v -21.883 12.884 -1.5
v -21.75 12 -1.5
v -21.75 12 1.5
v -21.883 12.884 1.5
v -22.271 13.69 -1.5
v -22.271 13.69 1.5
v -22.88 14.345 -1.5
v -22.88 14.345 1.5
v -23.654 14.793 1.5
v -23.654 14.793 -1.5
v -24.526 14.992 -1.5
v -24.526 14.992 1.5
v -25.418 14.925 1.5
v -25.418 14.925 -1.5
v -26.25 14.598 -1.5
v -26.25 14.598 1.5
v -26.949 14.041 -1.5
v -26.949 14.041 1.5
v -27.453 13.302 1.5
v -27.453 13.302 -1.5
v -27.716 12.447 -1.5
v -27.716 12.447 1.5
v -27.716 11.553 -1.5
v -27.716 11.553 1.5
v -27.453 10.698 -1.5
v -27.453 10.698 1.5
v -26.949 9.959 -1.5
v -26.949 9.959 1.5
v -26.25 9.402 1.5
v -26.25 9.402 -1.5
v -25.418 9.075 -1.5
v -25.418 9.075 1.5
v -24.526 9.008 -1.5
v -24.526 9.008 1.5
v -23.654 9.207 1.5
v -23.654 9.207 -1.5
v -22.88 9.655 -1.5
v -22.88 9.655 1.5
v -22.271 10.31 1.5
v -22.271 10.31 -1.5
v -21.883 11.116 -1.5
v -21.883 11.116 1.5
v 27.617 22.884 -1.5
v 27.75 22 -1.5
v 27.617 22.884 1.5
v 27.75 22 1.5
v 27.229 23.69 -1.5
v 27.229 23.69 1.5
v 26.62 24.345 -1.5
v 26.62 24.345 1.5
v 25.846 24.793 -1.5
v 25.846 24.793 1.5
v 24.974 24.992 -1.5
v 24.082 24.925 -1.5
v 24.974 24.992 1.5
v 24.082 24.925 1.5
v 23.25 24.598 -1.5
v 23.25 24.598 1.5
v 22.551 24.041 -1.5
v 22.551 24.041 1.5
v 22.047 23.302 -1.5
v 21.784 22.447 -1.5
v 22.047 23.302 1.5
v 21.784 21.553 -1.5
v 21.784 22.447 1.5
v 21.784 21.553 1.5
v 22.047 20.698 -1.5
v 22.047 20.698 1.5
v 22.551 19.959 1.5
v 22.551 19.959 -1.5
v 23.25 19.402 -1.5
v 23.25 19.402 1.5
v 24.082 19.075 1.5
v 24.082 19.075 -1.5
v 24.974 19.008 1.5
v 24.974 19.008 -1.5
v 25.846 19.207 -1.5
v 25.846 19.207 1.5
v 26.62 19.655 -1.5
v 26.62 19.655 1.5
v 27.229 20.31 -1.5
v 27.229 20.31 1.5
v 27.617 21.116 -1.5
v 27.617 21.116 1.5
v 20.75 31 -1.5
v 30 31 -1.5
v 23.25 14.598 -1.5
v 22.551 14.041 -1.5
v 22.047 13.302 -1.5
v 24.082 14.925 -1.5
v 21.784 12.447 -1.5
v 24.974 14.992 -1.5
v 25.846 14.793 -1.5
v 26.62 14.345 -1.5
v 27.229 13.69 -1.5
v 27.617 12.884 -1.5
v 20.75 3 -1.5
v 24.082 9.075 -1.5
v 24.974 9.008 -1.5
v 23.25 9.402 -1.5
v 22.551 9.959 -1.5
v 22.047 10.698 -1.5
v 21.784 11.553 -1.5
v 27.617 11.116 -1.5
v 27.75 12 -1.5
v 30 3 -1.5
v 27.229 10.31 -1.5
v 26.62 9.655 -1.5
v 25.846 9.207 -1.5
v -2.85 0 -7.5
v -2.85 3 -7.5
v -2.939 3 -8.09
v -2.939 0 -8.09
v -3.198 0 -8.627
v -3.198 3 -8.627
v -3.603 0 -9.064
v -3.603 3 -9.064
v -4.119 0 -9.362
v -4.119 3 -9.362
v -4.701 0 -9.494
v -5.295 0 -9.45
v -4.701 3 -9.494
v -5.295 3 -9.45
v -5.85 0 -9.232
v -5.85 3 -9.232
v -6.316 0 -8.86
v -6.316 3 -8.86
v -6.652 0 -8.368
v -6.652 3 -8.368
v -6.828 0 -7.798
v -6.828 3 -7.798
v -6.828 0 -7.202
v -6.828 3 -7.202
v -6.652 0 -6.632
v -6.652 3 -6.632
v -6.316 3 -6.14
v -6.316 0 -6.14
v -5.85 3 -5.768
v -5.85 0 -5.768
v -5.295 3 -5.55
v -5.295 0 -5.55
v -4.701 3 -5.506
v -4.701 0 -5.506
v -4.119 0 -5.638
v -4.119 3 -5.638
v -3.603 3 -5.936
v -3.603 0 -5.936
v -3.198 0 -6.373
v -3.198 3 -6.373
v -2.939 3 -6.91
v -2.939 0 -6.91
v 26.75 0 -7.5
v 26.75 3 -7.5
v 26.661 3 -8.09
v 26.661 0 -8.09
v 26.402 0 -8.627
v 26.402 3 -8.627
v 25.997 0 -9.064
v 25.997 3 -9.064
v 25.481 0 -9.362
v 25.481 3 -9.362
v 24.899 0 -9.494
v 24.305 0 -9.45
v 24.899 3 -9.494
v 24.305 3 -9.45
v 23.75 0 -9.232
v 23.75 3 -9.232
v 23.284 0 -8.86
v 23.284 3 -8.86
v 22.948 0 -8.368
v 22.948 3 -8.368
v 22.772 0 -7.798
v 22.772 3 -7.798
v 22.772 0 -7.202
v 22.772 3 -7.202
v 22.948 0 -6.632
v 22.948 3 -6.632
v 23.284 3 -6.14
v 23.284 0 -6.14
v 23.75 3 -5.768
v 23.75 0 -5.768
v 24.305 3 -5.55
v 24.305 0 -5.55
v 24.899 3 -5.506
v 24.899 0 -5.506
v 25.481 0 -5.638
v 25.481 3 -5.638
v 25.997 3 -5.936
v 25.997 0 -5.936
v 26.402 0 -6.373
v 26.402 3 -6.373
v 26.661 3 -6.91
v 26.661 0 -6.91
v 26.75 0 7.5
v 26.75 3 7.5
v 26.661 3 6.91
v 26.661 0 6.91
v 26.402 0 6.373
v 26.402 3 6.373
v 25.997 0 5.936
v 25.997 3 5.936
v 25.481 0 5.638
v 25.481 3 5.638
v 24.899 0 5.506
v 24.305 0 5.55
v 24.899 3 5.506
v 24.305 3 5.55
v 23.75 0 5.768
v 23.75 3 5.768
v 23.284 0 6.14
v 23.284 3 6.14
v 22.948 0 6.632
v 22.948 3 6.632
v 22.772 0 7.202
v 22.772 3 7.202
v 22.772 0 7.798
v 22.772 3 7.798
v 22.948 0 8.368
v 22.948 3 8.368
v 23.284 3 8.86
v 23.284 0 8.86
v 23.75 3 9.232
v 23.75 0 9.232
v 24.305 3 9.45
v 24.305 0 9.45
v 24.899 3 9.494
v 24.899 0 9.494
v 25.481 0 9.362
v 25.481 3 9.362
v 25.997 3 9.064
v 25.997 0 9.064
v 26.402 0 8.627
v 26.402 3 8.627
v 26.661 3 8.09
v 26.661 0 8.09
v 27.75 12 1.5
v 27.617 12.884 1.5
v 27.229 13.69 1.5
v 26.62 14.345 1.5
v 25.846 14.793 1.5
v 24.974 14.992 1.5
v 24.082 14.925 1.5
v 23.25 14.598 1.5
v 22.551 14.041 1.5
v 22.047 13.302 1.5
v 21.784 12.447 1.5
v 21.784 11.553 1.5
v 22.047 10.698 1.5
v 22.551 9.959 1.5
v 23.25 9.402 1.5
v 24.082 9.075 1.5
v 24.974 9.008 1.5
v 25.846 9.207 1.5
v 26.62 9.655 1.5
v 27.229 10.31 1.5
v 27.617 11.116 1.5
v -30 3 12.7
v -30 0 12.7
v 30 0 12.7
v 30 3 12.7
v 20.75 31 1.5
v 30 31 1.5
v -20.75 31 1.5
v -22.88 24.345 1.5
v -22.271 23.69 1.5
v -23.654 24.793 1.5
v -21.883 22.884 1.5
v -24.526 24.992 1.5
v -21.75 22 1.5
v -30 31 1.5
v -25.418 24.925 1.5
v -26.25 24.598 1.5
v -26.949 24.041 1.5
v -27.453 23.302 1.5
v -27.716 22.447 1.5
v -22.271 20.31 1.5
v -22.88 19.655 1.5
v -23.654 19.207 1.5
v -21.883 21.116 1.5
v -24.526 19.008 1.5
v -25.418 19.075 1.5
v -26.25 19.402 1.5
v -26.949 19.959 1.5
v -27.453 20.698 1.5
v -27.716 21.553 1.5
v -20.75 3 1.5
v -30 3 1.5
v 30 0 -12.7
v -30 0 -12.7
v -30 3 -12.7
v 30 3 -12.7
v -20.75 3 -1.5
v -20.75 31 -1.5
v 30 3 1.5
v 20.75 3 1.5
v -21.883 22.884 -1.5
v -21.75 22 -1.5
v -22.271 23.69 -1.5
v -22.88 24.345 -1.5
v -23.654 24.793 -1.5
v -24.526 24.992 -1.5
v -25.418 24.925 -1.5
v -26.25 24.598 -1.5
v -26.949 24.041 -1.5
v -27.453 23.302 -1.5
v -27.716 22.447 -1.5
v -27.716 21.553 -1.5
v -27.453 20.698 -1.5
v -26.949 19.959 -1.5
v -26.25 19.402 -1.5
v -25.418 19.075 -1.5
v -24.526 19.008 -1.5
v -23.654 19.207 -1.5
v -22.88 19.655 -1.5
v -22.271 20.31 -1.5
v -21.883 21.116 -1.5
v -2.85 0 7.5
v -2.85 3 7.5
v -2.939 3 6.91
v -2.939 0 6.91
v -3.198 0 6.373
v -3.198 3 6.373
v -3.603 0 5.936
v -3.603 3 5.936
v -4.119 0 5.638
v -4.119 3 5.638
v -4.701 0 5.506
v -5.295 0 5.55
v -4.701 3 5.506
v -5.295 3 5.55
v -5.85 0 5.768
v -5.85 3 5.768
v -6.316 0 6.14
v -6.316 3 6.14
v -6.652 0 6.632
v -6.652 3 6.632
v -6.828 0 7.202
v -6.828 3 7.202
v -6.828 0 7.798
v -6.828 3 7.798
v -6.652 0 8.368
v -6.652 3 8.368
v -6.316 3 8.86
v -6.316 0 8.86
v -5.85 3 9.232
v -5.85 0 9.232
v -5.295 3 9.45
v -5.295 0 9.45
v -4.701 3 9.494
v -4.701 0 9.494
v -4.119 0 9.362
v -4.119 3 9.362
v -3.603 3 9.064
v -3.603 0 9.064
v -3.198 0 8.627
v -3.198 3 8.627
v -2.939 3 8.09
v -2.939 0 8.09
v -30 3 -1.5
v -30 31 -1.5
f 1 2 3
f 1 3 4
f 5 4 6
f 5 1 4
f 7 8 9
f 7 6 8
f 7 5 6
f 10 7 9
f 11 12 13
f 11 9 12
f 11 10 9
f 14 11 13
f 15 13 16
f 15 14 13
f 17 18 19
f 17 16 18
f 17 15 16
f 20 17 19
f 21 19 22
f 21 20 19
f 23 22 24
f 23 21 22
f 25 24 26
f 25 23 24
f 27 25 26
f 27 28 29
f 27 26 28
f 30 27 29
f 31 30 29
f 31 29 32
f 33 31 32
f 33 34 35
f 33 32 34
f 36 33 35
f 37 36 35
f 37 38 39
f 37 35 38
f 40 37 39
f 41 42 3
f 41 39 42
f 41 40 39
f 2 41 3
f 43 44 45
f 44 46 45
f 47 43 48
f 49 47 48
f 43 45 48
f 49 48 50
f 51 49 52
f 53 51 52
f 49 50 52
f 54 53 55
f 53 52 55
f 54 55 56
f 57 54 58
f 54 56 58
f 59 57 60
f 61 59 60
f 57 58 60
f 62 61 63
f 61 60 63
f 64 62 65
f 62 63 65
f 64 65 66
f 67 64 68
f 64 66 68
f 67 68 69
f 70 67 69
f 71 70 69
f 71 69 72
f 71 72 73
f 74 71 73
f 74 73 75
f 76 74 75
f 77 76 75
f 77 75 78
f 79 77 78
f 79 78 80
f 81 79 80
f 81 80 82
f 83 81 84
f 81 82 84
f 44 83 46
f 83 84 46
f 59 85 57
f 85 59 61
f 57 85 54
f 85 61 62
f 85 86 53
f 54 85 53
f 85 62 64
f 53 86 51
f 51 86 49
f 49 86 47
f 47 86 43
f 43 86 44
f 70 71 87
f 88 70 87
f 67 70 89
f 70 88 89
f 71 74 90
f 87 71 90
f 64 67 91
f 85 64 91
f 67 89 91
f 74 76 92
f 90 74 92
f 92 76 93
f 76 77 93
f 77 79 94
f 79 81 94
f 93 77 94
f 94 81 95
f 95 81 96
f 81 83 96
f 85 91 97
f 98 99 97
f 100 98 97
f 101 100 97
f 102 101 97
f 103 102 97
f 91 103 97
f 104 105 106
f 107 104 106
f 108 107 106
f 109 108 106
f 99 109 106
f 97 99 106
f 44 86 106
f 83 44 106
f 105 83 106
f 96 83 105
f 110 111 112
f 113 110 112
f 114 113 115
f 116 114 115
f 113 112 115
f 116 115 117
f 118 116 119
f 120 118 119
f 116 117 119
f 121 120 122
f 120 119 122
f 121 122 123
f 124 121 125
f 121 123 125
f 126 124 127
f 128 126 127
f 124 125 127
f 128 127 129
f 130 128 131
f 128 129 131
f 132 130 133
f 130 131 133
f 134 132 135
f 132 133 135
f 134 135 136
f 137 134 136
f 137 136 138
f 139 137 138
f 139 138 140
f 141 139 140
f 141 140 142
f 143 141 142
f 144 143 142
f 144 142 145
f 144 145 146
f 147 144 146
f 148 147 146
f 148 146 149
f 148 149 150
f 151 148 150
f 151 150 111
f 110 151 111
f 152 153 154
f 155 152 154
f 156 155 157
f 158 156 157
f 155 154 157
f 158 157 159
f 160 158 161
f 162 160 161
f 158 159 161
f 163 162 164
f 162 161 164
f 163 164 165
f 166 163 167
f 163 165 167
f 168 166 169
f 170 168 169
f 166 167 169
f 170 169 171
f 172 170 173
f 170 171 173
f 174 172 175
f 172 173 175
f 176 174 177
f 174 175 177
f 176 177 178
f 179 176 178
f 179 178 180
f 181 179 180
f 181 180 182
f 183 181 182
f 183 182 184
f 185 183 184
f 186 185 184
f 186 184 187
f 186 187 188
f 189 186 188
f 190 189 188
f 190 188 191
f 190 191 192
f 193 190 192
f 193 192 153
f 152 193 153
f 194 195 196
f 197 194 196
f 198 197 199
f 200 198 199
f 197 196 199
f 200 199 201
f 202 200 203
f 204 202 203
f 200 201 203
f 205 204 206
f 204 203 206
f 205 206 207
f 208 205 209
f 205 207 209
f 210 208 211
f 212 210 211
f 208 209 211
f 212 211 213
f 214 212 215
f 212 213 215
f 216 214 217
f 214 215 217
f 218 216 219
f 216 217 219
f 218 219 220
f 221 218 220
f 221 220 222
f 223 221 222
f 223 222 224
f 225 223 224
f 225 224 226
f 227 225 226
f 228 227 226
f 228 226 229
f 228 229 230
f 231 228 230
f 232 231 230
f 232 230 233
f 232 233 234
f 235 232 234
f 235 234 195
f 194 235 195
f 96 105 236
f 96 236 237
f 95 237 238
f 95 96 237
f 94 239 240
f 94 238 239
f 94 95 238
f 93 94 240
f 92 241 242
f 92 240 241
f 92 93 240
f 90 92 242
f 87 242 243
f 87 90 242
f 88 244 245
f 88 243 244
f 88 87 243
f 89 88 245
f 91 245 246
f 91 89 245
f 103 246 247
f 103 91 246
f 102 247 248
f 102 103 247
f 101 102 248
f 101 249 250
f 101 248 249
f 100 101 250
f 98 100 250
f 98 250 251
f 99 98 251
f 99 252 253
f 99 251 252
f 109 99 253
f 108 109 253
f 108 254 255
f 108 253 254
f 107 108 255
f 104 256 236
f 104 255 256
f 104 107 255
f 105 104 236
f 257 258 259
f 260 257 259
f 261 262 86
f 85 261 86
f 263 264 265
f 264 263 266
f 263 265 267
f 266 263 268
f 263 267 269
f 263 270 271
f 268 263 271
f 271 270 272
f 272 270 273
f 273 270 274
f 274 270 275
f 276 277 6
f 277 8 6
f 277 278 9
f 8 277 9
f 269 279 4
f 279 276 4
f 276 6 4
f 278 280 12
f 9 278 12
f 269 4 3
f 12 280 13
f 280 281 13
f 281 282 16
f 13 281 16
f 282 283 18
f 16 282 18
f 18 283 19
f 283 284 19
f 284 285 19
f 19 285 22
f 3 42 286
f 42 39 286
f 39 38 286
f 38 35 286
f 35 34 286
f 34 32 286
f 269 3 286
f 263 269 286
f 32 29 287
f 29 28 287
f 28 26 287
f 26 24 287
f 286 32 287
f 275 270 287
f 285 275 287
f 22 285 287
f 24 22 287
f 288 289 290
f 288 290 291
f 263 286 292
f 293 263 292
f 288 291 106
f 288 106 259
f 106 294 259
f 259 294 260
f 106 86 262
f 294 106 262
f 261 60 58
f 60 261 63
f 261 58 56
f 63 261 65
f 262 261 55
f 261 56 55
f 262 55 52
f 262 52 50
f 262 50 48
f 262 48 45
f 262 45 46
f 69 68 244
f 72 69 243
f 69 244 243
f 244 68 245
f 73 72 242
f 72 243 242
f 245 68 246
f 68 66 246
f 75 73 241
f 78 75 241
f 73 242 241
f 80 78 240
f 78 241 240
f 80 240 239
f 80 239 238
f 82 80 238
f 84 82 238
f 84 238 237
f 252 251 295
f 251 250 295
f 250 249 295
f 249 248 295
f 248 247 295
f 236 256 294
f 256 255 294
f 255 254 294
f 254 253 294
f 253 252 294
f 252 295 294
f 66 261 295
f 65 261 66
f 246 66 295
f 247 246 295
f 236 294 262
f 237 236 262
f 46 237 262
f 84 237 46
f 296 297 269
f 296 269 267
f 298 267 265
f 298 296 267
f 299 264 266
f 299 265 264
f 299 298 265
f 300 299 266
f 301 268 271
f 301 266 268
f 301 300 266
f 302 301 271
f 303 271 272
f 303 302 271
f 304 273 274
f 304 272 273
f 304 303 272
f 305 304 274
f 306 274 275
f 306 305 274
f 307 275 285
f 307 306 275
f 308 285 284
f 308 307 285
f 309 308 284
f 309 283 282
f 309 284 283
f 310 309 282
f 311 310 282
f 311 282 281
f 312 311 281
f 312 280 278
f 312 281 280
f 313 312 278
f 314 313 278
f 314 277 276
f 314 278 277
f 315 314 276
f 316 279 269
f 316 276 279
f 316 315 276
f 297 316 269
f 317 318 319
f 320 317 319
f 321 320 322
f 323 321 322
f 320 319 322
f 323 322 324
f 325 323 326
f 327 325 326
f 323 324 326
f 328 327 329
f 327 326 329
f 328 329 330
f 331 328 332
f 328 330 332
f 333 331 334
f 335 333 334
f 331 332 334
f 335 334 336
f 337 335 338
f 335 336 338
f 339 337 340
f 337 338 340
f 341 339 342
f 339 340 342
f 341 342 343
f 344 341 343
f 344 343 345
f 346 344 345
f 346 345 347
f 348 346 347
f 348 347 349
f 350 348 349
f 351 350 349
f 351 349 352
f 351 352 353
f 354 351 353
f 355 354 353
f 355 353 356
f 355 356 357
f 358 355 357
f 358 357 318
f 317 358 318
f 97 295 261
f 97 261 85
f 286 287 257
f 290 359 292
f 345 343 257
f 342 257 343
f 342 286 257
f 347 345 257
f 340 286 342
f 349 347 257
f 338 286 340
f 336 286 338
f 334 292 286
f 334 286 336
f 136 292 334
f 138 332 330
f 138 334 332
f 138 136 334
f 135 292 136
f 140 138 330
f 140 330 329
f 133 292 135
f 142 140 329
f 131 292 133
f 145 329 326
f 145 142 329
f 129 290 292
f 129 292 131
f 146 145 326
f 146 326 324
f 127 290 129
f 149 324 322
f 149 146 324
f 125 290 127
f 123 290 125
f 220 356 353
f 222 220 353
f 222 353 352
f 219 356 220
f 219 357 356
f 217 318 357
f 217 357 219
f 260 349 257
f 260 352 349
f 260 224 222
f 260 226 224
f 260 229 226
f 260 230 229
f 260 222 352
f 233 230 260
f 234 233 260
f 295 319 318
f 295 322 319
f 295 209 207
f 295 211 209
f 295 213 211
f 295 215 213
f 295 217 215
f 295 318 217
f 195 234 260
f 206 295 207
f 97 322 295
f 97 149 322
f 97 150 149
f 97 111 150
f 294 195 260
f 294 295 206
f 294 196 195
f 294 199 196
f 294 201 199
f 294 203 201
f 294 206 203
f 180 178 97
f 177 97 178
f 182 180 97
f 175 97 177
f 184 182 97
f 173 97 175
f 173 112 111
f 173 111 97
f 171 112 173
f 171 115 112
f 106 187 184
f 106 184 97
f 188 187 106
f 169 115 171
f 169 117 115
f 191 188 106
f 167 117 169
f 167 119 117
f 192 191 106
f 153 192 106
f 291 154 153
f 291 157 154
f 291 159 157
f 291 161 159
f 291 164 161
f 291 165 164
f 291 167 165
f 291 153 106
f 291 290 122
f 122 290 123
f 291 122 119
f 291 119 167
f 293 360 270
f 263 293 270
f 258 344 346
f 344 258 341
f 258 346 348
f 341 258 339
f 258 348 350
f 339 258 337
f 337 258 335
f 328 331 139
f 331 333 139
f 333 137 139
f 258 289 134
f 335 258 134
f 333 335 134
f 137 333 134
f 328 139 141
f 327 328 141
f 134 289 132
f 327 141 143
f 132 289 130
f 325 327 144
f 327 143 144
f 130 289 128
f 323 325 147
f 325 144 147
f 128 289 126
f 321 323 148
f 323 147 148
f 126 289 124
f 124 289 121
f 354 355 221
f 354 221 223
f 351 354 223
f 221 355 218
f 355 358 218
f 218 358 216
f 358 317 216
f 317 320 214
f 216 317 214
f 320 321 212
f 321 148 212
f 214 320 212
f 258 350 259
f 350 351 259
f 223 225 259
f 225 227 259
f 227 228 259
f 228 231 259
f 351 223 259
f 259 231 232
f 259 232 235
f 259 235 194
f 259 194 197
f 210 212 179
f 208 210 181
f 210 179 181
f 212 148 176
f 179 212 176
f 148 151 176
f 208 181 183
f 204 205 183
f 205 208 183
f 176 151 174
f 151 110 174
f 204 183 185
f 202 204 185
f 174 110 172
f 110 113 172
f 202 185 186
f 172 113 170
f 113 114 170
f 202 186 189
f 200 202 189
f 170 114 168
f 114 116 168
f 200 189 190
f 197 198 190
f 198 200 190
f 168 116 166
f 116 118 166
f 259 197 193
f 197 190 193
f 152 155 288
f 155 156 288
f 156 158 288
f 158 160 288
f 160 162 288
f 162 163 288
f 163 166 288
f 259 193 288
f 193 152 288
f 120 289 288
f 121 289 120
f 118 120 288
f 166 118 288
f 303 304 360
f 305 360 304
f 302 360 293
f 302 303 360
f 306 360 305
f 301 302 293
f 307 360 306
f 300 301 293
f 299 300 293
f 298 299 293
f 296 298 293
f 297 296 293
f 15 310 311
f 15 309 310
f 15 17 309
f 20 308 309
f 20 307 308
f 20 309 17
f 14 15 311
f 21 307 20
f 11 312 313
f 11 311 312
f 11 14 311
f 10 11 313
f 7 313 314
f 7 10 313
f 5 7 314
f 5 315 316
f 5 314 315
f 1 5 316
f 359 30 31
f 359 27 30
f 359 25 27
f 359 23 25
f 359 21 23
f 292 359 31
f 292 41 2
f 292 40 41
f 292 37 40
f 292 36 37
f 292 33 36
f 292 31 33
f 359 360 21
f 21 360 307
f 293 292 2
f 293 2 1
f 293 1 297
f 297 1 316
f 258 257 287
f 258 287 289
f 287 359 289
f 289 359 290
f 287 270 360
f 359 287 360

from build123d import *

# Parameters (mm, degrees)
SKETCH_1_W          = 58
SKETCH_1_H          = 25.4
EXTRUDE_1_DEPTH     = 3
SKETCH_2_W          = 8
SKETCH_2_H          = 3
EXTRUDE_2_DEPTH     = 28
SKETCH_3_R          = 3
CUT_EXTRUDE_1_DEPTH = 12
SKETCH_4_R          = 2
CUT_EXTRUDE_2_DEPTH = 22
SKETCH_8_W          = 8
SKETCH_8_H          = 3
CUT_EXTRUDE_3_DEPTH = 28
EXTRUDE_3_DEPTH     = 1
EXTRUDE_4_DEPTH     = 1


with BuildPart() as part:
    # 草图1 → 凸台-拉伸1 (new body)
    with BuildSketch(Plane(origin=(0, 0, 0), x_dir=(1, 0, 0), z_dir=(0, 1, 0))):
        Rectangle(SKETCH_1_W, SKETCH_1_H)
    extrude(amount=EXTRUDE_1_DEPTH)

    # 草图2 → 凸台-拉伸2 (add)
    with BuildSketch(Plane(origin=(0, 3, 0), x_dir=(1, 0, 0), z_dir=(0, 1, 0))):
        with Locations((-24.75, 11.2)):
            Rectangle(SKETCH_2_W, SKETCH_2_H)
        with Locations((24.75, 11.2)):
            Rectangle(SKETCH_2_W, SKETCH_2_H)
        with Locations((-24.75, 0)):
            Rectangle(SKETCH_2_W, SKETCH_2_H)
        with Locations((24.75, 0)):
            Rectangle(SKETCH_2_W, SKETCH_2_H)
    extrude(amount=EXTRUDE_2_DEPTH)

    # 草图3 → 切除-拉伸1 (cut, symmetric)
    with BuildSketch(Plane.XY.offset(-9.7)):
        with Locations((-24.75, 12)):
            Circle(SKETCH_3_R)
        with Locations((-24.75, 22)):
            Circle(SKETCH_3_R)
        with Locations((24.75, 12)):
            Circle(SKETCH_3_R)
        with Locations((24.75, 22)):
            Circle(SKETCH_3_R)
    extrude(amount=CUT_EXTRUDE_1_DEPTH, both=True, mode=Mode.SUBTRACT)

    # 草图4 → 切除-拉伸2 (cut)
    with BuildSketch(Plane(origin=(0, 3, 0), x_dir=(1, 0, 0), z_dir=(0, 1, 0))):
        with Locations((24.75, -7.5)):
            Circle(SKETCH_4_R)
        with Locations((24.75, 7.5)):
            Circle(SKETCH_4_R)
        with Locations((-4.85, 7.5)):
            Circle(SKETCH_4_R)
        with Locations((-4.85, -7.5)):
            Circle(SKETCH_4_R)
    extrude(amount=-CUT_EXTRUDE_2_DEPTH, mode=Mode.SUBTRACT)

    # 草图8 → 切除-拉伸3 (cut)
    with BuildSketch(Plane(origin=(0, 31, 0), x_dir=(1, 0, 0), z_dir=(0, 1, 0))):
        with Locations((-24.75, 11.2)):
            Rectangle(SKETCH_8_W, SKETCH_8_H)
        with Locations((24.75, 11.2)):
            Rectangle(SKETCH_8_W, SKETCH_8_H)
    extrude(amount=-CUT_EXTRUDE_3_DEPTH, mode=Mode.SUBTRACT)

    # 草图9 → 凸台-拉伸3 (add, symmetric)
    with BuildSketch(Plane(origin=(29, 0, 0), x_dir=(0, 0, -1), z_dir=(1, 0, 0))):
        Polygon((-12.7, 3), (-1.5, 3), (-1.5, 31), (1.5, 31), (1.5, 3), (12.7, 3), (12.7, 0), (-12.7, 0), align=None)
    extrude(amount=EXTRUDE_3_DEPTH, both=True)

    # 草图10 → 凸台-拉伸4 (add, symmetric)
    with BuildSketch(Plane.ZY.offset(29)):
        Polygon((-12.7, 3), (-1.5, 3), (-1.5, 31), (1.5, 31), (1.5, 3), (12.7, 3), (12.7, 0), (-12.7, 0), align=None)
    extrude(amount=EXTRUDE_4_DEPTH, both=True)


solid = part.part
